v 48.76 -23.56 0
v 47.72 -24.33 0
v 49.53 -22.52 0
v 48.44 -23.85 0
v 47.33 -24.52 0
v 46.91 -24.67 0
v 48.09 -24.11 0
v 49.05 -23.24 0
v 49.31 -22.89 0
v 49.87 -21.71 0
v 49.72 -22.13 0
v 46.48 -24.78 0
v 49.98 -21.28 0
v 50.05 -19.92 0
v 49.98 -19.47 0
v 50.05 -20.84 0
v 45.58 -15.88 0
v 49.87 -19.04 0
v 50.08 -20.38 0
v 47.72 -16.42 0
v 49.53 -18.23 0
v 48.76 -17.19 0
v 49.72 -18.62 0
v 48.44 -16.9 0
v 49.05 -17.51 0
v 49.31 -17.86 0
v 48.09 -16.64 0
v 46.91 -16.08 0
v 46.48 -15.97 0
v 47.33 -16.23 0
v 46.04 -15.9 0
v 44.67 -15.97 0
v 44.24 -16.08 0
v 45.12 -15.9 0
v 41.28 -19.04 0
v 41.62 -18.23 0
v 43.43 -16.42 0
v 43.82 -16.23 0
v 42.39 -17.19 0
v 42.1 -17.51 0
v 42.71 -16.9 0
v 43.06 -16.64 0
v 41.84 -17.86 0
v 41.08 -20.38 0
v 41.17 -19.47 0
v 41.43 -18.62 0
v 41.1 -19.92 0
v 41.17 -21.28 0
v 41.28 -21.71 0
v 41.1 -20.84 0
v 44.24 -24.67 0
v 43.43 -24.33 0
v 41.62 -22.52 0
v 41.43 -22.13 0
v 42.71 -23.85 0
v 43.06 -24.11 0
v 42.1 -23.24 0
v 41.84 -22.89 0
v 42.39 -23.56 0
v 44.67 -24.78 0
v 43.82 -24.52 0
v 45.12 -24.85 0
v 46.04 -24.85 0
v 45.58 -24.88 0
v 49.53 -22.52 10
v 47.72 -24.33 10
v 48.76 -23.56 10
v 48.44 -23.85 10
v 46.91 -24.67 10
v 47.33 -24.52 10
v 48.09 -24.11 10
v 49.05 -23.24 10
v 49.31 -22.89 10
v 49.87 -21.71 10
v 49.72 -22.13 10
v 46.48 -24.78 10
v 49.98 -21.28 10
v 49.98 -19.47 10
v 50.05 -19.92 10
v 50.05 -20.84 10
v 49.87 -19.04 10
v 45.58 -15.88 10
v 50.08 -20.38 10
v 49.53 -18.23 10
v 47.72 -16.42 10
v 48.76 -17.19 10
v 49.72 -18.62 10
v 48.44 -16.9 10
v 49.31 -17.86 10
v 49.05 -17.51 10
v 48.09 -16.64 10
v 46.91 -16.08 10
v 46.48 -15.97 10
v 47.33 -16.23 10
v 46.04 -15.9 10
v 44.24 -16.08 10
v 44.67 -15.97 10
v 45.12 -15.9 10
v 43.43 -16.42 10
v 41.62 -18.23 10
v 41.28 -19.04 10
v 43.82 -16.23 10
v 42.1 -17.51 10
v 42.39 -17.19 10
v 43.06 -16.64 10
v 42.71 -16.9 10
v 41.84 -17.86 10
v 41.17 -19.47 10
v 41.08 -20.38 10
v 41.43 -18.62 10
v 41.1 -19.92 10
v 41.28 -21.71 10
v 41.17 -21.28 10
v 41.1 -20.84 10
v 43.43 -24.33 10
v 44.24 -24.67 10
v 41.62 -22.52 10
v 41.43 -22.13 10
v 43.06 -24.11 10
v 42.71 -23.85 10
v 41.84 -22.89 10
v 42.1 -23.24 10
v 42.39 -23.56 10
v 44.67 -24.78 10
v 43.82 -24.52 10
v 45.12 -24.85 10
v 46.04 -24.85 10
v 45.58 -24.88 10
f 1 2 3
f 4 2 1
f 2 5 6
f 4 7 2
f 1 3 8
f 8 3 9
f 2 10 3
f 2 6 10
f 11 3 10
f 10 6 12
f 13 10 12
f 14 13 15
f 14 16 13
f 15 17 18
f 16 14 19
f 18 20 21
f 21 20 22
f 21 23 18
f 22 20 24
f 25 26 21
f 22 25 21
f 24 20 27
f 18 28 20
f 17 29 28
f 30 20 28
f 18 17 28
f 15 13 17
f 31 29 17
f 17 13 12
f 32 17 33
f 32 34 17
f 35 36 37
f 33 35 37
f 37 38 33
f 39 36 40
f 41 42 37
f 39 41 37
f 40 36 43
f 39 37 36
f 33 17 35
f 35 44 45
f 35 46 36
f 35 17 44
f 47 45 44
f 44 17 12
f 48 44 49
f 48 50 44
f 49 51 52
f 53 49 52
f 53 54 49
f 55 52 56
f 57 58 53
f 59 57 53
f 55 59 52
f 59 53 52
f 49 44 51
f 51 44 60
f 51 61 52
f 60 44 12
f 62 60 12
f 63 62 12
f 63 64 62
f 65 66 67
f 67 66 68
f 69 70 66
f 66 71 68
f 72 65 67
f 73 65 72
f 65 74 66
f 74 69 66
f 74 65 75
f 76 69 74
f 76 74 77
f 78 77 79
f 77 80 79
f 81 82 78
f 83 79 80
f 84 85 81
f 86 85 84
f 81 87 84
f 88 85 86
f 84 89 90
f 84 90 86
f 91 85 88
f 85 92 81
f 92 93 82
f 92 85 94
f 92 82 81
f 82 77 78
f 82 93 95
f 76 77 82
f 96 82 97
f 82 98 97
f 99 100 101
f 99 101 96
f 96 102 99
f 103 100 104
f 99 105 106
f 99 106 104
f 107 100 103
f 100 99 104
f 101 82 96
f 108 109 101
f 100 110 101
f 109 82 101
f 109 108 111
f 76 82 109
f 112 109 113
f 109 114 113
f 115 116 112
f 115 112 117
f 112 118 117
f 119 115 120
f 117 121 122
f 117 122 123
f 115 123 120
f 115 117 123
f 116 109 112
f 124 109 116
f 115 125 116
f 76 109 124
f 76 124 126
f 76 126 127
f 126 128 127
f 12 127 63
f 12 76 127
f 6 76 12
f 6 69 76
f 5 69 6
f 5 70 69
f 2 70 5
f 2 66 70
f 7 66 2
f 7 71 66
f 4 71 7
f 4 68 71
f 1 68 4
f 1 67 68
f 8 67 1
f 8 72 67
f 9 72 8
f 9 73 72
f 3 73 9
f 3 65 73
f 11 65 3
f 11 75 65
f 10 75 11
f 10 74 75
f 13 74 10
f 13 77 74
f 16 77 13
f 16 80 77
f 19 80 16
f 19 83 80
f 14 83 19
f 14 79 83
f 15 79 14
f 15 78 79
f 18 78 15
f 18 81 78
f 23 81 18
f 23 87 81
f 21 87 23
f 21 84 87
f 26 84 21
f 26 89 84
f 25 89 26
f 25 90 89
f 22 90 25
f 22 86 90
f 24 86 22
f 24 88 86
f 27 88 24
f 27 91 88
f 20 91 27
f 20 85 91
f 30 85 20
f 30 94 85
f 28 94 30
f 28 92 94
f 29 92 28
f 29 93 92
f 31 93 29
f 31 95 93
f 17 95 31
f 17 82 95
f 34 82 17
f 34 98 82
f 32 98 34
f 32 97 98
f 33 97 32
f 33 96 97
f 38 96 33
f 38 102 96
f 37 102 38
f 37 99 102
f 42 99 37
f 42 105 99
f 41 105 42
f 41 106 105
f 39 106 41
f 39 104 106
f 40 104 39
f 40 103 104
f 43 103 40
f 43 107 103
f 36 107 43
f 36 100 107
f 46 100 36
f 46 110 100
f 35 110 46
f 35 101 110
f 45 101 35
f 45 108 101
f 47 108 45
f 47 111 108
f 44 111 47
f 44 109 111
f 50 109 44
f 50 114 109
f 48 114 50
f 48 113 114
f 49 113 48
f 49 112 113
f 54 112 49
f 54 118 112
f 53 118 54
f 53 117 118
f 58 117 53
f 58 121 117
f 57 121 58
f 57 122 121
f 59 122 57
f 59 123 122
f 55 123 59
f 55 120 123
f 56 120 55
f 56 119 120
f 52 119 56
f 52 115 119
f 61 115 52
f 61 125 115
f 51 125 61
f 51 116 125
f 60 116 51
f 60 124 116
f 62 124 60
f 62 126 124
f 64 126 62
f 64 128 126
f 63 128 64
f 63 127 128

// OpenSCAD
linear_extrude(height = 10, center = false) {

polygon(points=[[50.08,-20.38],[50.05,-20.84],[49.98,-21.28],[49.87,-21.71],[49.72,-22.13],[49.53,-22.52],[49.31,-22.89],[49.05,-23.24],[48.76,-23.56],[48.44,-23.85],[48.09,-24.11],[47.72,-24.33],[47.33,-24.52],[46.91,-24.67],[46.48,-24.78],[46.04,-24.85],[45.58,-24.88],[45.12,-24.85],[44.67,-24.78],[44.24,-24.67],[43.82,-24.52],[43.43,-24.33],[43.06,-24.11],[42.71,-23.85],[42.39,-23.56],[42.1,-23.24],[41.84,-22.89],[41.62,-22.52],[41.43,-22.13],[41.28,-21.71],[41.17,-21.28],[41.1,-20.84],[41.08,-20.38],[41.1,-19.92],[41.17,-19.47],[41.28,-19.04],[41.43,-18.62],[41.62,-18.23],[41.84,-17.86],[42.1,-17.51],[42.39,-17.19],[42.71,-16.9],[43.06,-16.64],[43.43,-16.42],[43.82,-16.23],[44.24,-16.08],[44.67,-15.97],[45.12,-15.9],[45.58,-15.88],[46.04,-15.9],[46.48,-15.97],[46.91,-16.08],[47.33,-16.23],[47.72,-16.42],[48.09,-16.64],[48.44,-16.9],[48.76,-17.19],[49.05,-17.51],[49.31,-17.86],[49.53,-18.23],[49.72,-18.62],[49.87,-19.04],[49.98,-19.47],[50.05,-19.92],[50.08,-20.38]]);

}
